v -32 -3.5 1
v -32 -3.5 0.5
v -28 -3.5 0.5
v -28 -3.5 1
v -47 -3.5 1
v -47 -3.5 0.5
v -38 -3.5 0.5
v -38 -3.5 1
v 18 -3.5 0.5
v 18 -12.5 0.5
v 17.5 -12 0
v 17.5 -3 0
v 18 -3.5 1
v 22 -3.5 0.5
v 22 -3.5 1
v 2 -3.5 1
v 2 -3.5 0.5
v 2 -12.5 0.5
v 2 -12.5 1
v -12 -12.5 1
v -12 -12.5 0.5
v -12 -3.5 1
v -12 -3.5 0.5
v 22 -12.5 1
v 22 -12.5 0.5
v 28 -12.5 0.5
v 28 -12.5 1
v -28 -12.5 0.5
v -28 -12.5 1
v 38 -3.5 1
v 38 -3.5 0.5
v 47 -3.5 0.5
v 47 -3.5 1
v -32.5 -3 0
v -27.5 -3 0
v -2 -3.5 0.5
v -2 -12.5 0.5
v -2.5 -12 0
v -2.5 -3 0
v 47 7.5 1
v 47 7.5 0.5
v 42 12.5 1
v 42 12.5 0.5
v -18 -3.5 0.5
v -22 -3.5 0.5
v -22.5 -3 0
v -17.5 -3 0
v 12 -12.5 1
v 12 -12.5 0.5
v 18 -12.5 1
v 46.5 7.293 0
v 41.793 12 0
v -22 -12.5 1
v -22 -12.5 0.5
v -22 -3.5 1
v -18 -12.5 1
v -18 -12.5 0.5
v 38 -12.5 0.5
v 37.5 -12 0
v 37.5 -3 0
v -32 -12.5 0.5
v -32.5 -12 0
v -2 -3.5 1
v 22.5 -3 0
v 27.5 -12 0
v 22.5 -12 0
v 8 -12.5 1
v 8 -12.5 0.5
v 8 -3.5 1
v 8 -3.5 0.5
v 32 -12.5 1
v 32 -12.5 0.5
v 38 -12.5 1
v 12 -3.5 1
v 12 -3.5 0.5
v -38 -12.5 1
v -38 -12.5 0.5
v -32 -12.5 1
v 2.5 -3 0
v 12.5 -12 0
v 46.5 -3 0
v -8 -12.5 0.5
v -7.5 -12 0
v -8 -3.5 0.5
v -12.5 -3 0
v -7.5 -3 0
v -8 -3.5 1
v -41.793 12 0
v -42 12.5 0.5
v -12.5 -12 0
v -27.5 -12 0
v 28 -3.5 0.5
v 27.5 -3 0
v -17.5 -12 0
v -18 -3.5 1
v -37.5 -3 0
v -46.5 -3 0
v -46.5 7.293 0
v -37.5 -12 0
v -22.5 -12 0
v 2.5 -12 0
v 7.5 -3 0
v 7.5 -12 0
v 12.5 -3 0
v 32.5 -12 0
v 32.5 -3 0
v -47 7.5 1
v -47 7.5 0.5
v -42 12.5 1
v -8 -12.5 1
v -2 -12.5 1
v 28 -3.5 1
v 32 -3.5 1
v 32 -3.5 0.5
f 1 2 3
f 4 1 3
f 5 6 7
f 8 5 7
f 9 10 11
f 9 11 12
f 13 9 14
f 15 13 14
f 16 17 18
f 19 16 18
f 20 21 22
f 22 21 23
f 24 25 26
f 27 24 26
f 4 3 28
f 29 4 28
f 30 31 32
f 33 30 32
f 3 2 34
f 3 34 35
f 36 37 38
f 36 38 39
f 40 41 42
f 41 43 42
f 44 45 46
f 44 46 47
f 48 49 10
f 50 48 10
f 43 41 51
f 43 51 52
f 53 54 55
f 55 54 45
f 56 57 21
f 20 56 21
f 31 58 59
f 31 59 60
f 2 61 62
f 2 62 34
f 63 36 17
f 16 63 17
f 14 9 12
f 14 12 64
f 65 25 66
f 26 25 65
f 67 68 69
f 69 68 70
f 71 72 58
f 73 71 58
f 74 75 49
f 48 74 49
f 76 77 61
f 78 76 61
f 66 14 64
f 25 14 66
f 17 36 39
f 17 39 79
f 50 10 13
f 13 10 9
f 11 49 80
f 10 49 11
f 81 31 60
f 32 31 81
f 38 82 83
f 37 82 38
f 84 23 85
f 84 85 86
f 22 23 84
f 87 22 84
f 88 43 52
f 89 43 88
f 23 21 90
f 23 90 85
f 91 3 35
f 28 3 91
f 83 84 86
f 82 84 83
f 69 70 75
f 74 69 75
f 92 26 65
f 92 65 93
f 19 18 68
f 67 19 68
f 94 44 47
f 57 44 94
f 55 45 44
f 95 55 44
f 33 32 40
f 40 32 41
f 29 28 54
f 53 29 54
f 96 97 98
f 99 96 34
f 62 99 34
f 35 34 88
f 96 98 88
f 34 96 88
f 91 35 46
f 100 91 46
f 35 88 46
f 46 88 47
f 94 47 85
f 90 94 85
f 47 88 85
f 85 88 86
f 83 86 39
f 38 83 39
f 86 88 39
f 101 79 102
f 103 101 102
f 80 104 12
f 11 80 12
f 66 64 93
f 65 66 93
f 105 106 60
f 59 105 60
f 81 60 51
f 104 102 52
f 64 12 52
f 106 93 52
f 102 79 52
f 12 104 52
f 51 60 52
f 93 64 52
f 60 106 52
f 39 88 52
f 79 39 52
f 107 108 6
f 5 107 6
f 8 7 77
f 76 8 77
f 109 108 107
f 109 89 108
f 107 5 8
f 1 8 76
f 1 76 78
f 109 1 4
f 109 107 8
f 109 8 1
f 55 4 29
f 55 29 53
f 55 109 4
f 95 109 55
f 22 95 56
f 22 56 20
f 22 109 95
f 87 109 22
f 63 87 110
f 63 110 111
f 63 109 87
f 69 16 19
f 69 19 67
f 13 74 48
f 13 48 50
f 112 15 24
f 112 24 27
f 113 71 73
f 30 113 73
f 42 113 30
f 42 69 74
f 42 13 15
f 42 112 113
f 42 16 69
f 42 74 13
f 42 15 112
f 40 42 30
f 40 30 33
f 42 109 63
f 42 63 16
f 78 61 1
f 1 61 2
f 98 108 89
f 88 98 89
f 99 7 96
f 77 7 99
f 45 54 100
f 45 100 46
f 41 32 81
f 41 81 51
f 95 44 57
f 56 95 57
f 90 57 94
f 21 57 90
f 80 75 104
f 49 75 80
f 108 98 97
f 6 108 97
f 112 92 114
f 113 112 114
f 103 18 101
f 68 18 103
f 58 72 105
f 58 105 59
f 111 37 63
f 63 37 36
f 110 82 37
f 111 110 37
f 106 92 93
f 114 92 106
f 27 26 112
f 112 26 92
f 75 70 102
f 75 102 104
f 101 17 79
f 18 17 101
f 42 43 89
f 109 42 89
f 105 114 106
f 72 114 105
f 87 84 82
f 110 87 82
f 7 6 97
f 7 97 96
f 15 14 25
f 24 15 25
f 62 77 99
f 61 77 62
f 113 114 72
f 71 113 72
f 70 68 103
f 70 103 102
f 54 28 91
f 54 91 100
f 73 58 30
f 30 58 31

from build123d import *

# Parameters (mm, degrees)
F2_DEPTH = 1
F3_SIZE  = 5
F4_SIZE  = 0.5


with BuildPart() as f2:
    # F1 (on face) → F2 (new body)
    with BuildSketch(Plane.XY):
        Polygon((-47, 12.5), (-47, -3.5), (-38, -3.5), (-38, -12.5), (-32, -12.5), (-32, -3.5), (-28, -3.5), (-28, -12.5), (-22, -12.5), (-22, -3.5), (-18, -3.5), (-18, -12.5), (-12, -12.5), (-12, -3.5), (-8, -3.5), (-8, -12.5), (-2, -12.5), (-2, -3.5), (2, -3.5), (2, -12.5), (8, -12.5), (8, -3.5), (12, -3.5), (12, -12.5), (18, -12.5), (18, -3.5), (22, -3.5), (22, -12.5), (28, -12.5), (28, -3.5), (32, -3.5), (32, -12.5), (38, -12.5), (38, -3.5), (47, -3.5), (47, 12.5), align=None)
    extrude(amount=F2_DEPTH)

    # F3
    f3_edges = [f2.edges().sort_by_distance(p)[0] for p in [
        (47, 12.5, 0.5),
        (-47, 12.5, 0.5),
    ]]
    chamfer(f3_edges, length=F3_SIZE)

    # F4
    f4_edges = [f2.edges().sort_by_distance(p)[0] for p in [
        (-47, 2, 0),
        (-44.5, 10, 0),
        (-42.5, -3.5, 0),
        (0, 12.5, 0),
        (-38, -8, 0),
        (44.5, 10, 0),
        (-35, -12.5, 0),
        (47, 2, 0),
        (-32, -8, 0),
        (42.5, -3.5, 0),
        (-30, -3.5, 0),
        (38, -8, 0),
        (-28, -8, 0),
        (35, -12.5, 0),
        (-25, -12.5, 0),
        (32, -8, 0),
        (-22, -8, 0),
        (30, -3.5, 0),
        (-20, -3.5, 0),
        (28, -8, 0),
        (-18, -8, 0),
        (25, -12.5, 0),
        (-15, -12.5, 0),
        (22, -8, 0),
        (-12, -8, 0),
        (20, -3.5, 0),
        (-10, -3.5, 0),
        (18, -8, 0),
        (-8, -8, 0),
        (15, -12.5, 0),
        (-5, -12.5, 0),
        (12, -8, 0),
        (-2, -8, 0),
        (10, -3.5, 0),
        (0, -3.5, 0),
        (8, -8, 0),
        (2, -8, 0),
        (5, -12.5, 0),
    ]]
    chamfer(f4_edges, length=F4_SIZE)


solid = f2.part
